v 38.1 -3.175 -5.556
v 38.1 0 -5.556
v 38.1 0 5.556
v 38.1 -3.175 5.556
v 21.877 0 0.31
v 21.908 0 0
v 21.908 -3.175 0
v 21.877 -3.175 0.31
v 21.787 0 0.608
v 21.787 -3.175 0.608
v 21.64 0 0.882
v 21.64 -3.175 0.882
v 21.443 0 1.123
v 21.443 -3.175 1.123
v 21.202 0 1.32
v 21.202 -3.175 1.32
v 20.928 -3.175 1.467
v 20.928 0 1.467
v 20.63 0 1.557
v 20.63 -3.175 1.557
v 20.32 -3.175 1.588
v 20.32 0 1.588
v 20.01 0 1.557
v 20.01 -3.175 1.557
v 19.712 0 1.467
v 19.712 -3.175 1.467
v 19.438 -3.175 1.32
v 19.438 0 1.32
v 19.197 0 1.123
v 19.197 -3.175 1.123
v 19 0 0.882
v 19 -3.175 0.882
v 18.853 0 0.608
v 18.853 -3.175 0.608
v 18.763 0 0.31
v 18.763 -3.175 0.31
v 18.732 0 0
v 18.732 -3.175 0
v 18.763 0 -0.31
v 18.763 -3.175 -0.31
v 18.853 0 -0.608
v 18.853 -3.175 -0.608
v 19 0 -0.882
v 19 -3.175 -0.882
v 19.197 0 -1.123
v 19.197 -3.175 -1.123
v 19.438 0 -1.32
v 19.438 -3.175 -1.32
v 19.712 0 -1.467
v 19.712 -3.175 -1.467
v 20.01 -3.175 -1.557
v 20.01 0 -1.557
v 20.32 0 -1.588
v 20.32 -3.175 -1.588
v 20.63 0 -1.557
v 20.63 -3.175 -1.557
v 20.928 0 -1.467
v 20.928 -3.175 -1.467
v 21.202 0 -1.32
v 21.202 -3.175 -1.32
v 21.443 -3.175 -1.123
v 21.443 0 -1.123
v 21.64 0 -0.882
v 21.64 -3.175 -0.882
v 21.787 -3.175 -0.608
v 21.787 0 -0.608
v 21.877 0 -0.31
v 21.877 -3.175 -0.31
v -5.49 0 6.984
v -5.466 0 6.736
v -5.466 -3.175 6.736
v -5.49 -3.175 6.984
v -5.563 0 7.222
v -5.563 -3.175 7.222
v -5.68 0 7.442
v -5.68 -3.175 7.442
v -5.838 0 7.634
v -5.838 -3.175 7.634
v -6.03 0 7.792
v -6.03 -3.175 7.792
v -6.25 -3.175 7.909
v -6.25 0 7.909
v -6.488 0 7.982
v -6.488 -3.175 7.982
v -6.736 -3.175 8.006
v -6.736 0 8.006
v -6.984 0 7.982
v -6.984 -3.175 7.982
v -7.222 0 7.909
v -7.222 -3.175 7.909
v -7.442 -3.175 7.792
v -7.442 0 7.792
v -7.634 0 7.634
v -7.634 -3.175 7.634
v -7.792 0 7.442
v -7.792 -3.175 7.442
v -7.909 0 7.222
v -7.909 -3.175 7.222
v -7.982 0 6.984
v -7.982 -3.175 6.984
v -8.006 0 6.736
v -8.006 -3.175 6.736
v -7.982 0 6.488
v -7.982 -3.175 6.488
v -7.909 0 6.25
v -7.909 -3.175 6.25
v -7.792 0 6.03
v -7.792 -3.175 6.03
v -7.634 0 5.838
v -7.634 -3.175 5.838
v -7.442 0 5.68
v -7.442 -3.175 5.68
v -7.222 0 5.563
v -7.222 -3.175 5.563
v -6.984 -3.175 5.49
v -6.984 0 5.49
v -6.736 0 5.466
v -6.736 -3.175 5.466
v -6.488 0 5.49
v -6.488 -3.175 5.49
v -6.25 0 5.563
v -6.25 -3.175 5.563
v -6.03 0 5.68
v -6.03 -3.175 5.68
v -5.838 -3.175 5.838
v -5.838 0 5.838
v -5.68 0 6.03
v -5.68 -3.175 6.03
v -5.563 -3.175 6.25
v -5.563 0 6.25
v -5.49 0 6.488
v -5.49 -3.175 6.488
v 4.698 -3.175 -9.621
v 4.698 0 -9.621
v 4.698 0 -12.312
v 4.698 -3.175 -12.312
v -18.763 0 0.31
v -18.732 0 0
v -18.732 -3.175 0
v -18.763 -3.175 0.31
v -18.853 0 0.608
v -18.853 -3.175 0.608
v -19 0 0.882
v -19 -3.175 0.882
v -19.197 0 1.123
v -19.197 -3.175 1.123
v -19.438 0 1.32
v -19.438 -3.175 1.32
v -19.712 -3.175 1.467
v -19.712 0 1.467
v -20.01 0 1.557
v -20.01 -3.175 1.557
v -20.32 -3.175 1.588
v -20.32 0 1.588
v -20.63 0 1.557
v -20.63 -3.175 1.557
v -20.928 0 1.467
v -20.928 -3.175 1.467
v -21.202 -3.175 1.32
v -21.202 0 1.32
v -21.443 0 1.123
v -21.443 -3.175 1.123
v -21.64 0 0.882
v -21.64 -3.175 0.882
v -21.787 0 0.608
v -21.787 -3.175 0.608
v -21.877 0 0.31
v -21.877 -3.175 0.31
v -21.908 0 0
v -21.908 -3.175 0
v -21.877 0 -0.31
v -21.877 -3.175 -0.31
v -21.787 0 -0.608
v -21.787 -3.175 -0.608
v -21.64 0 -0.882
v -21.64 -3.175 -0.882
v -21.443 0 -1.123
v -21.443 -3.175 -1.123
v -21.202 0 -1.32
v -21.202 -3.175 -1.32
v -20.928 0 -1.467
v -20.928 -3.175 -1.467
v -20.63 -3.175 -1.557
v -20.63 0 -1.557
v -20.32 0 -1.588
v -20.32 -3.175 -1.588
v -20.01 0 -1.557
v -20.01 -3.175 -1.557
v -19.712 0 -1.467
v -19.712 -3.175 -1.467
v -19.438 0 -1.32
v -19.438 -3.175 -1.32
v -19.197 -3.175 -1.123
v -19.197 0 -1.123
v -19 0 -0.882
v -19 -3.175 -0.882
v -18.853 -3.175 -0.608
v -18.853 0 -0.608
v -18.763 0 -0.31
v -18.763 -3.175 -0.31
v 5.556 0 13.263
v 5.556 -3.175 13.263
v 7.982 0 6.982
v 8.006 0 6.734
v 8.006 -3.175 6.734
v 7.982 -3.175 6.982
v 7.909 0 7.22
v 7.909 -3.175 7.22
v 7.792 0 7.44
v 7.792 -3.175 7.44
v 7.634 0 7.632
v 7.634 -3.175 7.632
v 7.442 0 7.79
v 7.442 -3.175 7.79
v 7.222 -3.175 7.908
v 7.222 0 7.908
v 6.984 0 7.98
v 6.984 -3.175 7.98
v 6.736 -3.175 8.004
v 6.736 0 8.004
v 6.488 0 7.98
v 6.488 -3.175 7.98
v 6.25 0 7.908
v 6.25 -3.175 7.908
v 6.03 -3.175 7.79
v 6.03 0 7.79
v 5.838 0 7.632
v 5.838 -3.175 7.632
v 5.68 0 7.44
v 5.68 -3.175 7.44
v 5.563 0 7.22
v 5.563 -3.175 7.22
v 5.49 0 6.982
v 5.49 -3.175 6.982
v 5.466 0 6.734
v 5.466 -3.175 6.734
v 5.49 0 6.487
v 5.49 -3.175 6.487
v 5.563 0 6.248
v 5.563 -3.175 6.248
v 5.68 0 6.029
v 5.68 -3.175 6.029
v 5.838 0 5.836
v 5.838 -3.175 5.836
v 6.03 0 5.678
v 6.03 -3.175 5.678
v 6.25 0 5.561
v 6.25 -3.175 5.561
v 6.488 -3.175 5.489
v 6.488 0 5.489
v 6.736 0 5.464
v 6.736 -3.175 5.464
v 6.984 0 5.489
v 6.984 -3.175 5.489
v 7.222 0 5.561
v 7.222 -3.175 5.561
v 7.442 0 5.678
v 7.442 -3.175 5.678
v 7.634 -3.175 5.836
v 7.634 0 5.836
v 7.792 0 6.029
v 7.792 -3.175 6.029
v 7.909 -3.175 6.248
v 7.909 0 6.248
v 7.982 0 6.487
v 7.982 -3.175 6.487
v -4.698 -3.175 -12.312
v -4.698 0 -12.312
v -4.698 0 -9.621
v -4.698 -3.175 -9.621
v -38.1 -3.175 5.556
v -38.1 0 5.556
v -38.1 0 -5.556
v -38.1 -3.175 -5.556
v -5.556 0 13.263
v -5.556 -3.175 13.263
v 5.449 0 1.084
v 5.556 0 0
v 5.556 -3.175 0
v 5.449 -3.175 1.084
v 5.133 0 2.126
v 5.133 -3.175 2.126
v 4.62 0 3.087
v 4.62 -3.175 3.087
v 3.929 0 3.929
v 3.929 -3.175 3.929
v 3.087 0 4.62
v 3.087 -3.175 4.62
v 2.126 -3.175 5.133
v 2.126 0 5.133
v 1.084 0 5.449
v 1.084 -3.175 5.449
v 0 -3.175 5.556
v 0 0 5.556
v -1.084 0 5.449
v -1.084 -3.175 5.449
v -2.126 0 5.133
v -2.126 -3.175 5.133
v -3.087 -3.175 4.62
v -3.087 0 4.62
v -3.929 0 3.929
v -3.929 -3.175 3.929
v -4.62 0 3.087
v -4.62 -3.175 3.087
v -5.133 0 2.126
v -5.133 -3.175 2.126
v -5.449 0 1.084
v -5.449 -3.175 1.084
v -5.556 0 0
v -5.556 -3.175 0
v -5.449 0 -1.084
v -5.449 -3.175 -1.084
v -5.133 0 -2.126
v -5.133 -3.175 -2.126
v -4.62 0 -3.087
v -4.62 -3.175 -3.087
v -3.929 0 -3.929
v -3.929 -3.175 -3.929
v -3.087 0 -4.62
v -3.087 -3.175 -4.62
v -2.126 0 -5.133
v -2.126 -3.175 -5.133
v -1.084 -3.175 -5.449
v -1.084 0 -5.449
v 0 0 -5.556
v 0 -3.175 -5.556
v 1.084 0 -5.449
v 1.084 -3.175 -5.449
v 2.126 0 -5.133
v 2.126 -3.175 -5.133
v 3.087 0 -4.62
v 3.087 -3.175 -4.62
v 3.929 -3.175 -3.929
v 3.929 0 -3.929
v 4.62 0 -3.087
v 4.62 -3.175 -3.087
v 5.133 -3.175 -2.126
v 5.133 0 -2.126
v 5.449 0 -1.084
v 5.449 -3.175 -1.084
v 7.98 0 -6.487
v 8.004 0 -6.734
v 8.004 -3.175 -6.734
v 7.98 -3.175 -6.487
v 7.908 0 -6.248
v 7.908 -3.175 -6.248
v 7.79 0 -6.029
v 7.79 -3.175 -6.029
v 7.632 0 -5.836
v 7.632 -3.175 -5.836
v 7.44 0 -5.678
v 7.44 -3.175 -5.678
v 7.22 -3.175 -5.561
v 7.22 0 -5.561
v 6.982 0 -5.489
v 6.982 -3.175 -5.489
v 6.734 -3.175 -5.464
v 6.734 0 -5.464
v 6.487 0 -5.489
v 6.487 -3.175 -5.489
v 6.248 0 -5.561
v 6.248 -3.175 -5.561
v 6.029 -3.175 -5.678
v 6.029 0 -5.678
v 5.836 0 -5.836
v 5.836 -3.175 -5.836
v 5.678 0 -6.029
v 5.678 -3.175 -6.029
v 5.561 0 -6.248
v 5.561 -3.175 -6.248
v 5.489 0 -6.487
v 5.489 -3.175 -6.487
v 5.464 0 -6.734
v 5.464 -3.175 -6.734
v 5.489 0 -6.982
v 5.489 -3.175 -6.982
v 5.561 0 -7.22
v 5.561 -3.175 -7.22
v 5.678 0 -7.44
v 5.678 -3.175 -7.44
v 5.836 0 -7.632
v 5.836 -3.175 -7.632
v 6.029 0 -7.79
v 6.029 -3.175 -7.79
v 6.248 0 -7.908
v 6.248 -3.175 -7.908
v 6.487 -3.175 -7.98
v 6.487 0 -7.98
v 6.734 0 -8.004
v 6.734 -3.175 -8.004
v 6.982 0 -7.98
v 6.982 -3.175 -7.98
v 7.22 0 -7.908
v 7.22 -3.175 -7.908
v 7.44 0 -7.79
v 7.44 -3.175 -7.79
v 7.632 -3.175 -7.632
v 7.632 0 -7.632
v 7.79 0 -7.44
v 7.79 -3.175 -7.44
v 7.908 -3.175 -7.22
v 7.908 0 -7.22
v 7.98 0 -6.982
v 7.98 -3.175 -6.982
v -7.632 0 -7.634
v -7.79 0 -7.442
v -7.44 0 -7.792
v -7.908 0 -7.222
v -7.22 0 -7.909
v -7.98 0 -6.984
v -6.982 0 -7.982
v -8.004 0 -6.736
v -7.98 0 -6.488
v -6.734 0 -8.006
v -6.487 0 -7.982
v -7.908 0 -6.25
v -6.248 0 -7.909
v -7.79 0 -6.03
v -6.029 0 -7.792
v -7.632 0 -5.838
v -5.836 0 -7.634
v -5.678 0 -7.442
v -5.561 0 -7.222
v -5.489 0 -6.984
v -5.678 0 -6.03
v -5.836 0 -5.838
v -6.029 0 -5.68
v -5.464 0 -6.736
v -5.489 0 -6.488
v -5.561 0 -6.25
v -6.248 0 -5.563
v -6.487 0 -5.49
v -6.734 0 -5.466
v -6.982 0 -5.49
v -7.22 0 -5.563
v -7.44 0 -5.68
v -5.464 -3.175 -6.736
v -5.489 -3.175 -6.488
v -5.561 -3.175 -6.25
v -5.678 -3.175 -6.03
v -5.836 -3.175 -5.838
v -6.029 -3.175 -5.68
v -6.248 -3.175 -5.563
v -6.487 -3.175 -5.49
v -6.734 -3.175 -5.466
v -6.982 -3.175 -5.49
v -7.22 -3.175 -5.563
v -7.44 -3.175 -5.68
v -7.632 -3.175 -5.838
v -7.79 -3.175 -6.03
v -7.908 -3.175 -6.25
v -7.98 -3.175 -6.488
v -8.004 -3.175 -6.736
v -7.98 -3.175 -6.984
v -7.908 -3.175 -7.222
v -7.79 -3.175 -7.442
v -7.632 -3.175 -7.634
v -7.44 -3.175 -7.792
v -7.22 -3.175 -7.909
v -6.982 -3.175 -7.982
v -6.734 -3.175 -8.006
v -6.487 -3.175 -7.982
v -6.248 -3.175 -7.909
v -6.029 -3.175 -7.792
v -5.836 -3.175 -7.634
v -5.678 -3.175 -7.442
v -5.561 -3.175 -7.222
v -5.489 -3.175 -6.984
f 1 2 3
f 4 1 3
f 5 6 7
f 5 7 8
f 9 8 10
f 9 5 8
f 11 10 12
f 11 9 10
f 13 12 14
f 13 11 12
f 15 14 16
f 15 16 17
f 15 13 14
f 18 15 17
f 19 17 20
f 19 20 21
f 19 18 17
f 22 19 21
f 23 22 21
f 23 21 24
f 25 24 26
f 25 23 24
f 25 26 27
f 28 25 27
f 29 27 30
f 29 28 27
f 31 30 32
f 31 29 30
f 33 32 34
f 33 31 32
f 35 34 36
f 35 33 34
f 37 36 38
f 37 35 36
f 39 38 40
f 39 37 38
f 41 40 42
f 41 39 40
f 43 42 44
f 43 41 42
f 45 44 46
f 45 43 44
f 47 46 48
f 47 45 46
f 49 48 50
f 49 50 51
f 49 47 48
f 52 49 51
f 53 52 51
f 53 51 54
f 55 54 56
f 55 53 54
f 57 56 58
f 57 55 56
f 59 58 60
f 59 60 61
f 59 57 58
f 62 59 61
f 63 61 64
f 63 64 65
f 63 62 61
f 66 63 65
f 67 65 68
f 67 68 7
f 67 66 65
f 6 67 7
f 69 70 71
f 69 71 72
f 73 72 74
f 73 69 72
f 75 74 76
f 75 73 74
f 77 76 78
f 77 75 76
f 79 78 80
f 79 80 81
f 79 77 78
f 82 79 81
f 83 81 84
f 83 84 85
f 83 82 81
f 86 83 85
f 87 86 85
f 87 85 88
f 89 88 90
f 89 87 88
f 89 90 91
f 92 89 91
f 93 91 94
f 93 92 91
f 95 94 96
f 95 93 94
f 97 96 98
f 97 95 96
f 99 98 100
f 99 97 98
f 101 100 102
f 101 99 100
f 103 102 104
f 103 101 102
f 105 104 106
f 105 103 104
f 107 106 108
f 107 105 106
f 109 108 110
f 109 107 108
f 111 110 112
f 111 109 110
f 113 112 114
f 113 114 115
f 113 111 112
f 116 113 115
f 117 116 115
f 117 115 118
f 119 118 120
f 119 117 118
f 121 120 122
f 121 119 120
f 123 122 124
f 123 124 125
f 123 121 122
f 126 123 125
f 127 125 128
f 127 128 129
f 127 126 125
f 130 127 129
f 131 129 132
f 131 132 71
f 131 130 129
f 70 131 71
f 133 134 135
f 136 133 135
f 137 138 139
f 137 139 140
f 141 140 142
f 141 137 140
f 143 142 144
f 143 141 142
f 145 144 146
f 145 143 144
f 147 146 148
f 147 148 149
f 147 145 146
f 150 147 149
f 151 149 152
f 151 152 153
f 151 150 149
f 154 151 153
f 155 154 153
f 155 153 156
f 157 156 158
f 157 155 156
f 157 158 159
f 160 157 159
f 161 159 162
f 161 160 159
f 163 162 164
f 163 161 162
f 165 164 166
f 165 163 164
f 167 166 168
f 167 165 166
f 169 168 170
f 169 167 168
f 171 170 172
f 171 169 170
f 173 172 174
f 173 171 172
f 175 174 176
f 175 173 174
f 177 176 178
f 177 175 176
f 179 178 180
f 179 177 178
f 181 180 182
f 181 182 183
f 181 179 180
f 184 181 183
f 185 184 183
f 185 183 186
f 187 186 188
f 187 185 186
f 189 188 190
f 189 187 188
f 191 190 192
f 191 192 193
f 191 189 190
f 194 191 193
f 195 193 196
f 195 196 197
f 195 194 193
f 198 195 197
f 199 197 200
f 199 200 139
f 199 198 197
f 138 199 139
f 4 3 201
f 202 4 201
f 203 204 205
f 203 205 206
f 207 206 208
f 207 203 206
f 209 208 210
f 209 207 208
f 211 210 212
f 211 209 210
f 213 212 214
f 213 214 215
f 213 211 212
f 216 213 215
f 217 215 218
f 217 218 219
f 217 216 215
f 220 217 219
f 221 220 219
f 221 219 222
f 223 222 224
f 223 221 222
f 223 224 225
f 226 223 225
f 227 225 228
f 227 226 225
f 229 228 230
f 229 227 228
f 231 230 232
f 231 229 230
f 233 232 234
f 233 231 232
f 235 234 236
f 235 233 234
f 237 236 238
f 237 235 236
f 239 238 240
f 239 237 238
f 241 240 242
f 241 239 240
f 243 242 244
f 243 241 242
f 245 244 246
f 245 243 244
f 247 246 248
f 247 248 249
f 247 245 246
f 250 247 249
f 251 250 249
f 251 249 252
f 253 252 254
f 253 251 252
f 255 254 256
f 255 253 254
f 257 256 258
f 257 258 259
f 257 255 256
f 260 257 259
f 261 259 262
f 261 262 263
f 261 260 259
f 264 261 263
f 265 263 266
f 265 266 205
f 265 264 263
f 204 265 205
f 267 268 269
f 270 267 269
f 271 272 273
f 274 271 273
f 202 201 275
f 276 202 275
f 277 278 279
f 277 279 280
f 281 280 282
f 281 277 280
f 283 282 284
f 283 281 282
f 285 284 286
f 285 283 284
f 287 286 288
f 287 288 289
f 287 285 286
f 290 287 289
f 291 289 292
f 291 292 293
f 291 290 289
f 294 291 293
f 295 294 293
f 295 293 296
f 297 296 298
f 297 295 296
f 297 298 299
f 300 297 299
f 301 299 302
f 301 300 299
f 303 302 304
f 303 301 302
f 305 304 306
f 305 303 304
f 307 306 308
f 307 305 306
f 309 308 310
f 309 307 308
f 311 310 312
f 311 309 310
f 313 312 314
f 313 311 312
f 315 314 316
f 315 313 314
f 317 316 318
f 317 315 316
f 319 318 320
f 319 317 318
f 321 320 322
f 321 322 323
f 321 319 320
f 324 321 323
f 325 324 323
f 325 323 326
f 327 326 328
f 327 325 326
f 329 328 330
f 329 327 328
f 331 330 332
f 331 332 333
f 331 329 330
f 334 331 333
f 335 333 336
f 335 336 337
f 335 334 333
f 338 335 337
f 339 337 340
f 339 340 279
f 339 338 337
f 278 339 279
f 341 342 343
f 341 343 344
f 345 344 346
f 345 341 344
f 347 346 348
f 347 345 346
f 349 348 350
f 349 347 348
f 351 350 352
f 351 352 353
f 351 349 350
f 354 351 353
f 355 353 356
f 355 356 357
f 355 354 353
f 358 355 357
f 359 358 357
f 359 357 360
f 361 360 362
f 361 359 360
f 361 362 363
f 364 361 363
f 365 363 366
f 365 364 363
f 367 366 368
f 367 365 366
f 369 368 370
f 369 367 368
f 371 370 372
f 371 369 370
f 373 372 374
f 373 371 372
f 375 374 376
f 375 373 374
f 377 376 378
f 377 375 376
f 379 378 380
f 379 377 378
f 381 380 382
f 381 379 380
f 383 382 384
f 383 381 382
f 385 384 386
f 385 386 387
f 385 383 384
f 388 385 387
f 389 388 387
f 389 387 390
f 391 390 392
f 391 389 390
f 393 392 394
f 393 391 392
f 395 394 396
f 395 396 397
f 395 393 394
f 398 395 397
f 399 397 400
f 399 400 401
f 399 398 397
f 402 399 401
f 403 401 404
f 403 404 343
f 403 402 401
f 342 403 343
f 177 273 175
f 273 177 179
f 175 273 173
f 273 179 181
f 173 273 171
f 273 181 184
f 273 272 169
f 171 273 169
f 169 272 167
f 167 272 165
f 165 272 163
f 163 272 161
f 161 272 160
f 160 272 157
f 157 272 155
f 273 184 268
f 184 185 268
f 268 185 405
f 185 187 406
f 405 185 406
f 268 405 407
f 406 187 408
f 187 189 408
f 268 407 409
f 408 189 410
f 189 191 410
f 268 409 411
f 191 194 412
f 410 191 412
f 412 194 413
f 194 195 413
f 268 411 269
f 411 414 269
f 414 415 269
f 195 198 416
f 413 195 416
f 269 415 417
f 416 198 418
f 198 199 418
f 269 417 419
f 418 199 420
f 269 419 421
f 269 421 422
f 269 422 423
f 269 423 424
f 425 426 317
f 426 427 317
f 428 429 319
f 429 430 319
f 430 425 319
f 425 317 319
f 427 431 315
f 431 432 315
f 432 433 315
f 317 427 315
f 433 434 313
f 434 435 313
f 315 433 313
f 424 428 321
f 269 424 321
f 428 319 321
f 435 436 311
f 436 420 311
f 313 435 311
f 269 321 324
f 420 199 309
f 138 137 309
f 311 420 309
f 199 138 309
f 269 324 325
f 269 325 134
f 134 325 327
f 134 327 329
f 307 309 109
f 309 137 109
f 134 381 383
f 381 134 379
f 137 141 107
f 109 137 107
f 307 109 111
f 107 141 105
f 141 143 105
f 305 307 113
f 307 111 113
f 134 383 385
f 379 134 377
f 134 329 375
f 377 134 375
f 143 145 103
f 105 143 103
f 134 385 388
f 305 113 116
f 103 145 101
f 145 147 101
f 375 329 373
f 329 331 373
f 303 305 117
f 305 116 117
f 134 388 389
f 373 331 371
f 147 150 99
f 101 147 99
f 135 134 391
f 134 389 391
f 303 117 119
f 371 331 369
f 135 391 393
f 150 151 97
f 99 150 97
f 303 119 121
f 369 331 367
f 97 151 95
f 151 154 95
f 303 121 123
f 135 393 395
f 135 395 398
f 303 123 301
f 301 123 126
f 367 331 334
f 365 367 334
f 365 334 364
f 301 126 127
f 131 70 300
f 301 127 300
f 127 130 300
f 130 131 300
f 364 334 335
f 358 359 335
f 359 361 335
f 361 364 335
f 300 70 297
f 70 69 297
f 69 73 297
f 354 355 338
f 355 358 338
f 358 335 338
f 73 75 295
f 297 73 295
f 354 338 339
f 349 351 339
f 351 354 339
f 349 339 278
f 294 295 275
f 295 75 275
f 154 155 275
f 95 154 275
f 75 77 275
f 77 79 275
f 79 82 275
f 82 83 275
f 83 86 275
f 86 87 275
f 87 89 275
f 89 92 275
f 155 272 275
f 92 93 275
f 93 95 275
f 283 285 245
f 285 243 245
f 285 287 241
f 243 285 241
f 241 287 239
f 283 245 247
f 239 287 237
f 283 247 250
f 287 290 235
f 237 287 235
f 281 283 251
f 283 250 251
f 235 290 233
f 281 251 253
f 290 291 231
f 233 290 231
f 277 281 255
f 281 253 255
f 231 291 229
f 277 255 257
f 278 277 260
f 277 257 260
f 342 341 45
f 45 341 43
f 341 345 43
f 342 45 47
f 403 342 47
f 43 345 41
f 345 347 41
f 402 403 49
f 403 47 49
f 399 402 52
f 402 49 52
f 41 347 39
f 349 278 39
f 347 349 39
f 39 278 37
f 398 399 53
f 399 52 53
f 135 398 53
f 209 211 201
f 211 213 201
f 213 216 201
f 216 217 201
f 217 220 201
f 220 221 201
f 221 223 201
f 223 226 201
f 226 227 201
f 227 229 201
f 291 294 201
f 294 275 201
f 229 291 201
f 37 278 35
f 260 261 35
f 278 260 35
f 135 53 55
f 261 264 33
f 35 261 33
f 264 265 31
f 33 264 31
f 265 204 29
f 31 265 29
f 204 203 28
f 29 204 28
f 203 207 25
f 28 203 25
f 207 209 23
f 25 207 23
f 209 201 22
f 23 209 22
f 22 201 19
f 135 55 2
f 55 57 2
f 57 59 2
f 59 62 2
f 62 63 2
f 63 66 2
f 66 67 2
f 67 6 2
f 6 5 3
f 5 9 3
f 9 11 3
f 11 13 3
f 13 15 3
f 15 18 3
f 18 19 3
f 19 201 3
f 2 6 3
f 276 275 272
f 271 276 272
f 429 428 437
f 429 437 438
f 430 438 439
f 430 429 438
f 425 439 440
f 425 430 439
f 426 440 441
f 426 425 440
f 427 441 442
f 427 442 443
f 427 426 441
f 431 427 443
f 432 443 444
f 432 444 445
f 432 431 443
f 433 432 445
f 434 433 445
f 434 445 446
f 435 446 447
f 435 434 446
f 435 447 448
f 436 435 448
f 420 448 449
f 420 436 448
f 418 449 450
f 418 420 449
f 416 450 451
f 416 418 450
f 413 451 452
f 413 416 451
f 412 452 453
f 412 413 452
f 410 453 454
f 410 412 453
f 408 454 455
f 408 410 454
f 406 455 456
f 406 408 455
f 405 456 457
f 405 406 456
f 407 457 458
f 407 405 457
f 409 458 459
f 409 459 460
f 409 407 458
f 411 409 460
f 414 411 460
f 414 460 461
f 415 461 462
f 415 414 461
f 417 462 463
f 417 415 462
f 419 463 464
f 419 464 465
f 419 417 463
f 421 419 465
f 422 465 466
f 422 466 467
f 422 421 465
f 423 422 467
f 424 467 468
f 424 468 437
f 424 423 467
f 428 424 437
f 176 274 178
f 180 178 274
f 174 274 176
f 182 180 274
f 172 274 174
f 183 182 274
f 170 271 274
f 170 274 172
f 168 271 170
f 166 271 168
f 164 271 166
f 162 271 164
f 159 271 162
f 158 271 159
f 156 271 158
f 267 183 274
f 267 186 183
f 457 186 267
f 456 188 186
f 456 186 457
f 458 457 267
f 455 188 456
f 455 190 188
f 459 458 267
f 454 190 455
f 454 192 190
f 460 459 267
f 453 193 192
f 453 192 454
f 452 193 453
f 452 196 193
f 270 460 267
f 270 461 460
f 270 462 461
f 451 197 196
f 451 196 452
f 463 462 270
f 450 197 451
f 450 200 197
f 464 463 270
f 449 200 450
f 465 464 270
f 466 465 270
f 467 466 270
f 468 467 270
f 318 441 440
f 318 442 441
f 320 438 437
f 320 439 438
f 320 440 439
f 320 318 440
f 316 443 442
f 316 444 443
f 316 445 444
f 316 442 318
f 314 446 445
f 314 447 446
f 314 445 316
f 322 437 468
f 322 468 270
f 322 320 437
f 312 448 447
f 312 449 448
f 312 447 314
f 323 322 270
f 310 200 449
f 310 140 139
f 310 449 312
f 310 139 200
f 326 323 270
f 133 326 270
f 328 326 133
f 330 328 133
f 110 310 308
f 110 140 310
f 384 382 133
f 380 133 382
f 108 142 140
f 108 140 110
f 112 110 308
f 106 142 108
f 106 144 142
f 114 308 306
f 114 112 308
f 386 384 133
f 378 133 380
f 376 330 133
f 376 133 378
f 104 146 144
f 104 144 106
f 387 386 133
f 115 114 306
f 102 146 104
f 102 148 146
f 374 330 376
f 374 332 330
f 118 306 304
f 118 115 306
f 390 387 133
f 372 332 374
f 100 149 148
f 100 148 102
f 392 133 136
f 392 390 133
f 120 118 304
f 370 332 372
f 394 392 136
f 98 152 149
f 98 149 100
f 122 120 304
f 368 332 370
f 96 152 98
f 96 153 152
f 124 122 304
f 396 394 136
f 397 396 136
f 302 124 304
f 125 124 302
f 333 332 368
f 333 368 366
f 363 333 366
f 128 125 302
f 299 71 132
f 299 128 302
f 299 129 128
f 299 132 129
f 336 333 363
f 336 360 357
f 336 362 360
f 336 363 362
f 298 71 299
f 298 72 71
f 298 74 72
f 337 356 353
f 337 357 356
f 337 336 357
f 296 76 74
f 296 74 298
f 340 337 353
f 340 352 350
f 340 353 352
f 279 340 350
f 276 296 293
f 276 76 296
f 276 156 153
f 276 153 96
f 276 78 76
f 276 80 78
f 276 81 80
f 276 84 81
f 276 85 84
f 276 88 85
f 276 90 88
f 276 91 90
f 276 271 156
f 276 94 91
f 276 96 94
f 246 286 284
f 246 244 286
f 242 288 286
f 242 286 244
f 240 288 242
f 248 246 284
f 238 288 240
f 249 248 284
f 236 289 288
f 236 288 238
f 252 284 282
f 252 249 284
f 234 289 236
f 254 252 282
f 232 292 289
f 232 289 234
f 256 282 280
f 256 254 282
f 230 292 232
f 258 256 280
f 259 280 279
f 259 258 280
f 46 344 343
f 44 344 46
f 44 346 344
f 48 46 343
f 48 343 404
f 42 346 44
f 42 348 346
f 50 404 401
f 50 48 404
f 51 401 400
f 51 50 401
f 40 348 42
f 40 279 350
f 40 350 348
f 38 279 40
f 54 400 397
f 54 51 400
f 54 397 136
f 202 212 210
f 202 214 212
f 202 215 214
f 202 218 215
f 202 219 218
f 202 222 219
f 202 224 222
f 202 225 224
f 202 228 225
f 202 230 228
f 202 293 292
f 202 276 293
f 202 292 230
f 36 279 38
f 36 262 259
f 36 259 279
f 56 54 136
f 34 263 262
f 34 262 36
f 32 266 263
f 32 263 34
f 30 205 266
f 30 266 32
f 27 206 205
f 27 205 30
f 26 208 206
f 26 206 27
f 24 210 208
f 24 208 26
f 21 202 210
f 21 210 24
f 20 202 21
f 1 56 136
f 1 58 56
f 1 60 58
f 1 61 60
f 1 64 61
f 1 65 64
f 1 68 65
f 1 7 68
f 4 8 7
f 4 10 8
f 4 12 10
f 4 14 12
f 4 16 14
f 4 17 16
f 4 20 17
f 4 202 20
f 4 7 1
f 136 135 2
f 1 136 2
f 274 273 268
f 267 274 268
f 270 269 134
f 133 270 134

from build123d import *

# Parameters (mm, degrees)
F0_R     = 1.27
F0_R_2   = 1.5875
F0_R_3   = 5.55625
F1_DEPTH = 3.175


with BuildPart() as f1:
    # F0 (on Front) → F1 (new body)
    with BuildSketch(Plane.XZ):
        Polygon((4.698286, -12.312303), (38.1, -5.55625), (38.1, 5.55625), (5.55625, 13.26261), (-5.55625, 13.26261), (-38.1, 5.55625), (-38.1, -5.55625), (-4.698286, -12.312303), (-4.698286, -9.621484), (4.698286, -9.621484), align=None)
        with Locations((-6.734358, -6.736026)):
            Circle(F0_R, mode=Mode.SUBTRACT)
        with Locations((-20.32, 0)):
            Circle(F0_R_2, mode=Mode.SUBTRACT)
        with Locations((6.734358, -6.734358)):
            Circle(F0_R, mode=Mode.SUBTRACT)
        Circle(F0_R_3, mode=Mode.SUBTRACT)
        with Locations((20.32, 0)):
            Circle(F0_R_2, mode=Mode.SUBTRACT)
        with Locations((-6.736026, 6.736026)):
            Circle(F0_R, mode=Mode.SUBTRACT)
        with Locations((6.736026, 6.734358)):
            Circle(F0_R, mode=Mode.SUBTRACT)
    extrude(amount=F1_DEPTH)


solid = f1.part
